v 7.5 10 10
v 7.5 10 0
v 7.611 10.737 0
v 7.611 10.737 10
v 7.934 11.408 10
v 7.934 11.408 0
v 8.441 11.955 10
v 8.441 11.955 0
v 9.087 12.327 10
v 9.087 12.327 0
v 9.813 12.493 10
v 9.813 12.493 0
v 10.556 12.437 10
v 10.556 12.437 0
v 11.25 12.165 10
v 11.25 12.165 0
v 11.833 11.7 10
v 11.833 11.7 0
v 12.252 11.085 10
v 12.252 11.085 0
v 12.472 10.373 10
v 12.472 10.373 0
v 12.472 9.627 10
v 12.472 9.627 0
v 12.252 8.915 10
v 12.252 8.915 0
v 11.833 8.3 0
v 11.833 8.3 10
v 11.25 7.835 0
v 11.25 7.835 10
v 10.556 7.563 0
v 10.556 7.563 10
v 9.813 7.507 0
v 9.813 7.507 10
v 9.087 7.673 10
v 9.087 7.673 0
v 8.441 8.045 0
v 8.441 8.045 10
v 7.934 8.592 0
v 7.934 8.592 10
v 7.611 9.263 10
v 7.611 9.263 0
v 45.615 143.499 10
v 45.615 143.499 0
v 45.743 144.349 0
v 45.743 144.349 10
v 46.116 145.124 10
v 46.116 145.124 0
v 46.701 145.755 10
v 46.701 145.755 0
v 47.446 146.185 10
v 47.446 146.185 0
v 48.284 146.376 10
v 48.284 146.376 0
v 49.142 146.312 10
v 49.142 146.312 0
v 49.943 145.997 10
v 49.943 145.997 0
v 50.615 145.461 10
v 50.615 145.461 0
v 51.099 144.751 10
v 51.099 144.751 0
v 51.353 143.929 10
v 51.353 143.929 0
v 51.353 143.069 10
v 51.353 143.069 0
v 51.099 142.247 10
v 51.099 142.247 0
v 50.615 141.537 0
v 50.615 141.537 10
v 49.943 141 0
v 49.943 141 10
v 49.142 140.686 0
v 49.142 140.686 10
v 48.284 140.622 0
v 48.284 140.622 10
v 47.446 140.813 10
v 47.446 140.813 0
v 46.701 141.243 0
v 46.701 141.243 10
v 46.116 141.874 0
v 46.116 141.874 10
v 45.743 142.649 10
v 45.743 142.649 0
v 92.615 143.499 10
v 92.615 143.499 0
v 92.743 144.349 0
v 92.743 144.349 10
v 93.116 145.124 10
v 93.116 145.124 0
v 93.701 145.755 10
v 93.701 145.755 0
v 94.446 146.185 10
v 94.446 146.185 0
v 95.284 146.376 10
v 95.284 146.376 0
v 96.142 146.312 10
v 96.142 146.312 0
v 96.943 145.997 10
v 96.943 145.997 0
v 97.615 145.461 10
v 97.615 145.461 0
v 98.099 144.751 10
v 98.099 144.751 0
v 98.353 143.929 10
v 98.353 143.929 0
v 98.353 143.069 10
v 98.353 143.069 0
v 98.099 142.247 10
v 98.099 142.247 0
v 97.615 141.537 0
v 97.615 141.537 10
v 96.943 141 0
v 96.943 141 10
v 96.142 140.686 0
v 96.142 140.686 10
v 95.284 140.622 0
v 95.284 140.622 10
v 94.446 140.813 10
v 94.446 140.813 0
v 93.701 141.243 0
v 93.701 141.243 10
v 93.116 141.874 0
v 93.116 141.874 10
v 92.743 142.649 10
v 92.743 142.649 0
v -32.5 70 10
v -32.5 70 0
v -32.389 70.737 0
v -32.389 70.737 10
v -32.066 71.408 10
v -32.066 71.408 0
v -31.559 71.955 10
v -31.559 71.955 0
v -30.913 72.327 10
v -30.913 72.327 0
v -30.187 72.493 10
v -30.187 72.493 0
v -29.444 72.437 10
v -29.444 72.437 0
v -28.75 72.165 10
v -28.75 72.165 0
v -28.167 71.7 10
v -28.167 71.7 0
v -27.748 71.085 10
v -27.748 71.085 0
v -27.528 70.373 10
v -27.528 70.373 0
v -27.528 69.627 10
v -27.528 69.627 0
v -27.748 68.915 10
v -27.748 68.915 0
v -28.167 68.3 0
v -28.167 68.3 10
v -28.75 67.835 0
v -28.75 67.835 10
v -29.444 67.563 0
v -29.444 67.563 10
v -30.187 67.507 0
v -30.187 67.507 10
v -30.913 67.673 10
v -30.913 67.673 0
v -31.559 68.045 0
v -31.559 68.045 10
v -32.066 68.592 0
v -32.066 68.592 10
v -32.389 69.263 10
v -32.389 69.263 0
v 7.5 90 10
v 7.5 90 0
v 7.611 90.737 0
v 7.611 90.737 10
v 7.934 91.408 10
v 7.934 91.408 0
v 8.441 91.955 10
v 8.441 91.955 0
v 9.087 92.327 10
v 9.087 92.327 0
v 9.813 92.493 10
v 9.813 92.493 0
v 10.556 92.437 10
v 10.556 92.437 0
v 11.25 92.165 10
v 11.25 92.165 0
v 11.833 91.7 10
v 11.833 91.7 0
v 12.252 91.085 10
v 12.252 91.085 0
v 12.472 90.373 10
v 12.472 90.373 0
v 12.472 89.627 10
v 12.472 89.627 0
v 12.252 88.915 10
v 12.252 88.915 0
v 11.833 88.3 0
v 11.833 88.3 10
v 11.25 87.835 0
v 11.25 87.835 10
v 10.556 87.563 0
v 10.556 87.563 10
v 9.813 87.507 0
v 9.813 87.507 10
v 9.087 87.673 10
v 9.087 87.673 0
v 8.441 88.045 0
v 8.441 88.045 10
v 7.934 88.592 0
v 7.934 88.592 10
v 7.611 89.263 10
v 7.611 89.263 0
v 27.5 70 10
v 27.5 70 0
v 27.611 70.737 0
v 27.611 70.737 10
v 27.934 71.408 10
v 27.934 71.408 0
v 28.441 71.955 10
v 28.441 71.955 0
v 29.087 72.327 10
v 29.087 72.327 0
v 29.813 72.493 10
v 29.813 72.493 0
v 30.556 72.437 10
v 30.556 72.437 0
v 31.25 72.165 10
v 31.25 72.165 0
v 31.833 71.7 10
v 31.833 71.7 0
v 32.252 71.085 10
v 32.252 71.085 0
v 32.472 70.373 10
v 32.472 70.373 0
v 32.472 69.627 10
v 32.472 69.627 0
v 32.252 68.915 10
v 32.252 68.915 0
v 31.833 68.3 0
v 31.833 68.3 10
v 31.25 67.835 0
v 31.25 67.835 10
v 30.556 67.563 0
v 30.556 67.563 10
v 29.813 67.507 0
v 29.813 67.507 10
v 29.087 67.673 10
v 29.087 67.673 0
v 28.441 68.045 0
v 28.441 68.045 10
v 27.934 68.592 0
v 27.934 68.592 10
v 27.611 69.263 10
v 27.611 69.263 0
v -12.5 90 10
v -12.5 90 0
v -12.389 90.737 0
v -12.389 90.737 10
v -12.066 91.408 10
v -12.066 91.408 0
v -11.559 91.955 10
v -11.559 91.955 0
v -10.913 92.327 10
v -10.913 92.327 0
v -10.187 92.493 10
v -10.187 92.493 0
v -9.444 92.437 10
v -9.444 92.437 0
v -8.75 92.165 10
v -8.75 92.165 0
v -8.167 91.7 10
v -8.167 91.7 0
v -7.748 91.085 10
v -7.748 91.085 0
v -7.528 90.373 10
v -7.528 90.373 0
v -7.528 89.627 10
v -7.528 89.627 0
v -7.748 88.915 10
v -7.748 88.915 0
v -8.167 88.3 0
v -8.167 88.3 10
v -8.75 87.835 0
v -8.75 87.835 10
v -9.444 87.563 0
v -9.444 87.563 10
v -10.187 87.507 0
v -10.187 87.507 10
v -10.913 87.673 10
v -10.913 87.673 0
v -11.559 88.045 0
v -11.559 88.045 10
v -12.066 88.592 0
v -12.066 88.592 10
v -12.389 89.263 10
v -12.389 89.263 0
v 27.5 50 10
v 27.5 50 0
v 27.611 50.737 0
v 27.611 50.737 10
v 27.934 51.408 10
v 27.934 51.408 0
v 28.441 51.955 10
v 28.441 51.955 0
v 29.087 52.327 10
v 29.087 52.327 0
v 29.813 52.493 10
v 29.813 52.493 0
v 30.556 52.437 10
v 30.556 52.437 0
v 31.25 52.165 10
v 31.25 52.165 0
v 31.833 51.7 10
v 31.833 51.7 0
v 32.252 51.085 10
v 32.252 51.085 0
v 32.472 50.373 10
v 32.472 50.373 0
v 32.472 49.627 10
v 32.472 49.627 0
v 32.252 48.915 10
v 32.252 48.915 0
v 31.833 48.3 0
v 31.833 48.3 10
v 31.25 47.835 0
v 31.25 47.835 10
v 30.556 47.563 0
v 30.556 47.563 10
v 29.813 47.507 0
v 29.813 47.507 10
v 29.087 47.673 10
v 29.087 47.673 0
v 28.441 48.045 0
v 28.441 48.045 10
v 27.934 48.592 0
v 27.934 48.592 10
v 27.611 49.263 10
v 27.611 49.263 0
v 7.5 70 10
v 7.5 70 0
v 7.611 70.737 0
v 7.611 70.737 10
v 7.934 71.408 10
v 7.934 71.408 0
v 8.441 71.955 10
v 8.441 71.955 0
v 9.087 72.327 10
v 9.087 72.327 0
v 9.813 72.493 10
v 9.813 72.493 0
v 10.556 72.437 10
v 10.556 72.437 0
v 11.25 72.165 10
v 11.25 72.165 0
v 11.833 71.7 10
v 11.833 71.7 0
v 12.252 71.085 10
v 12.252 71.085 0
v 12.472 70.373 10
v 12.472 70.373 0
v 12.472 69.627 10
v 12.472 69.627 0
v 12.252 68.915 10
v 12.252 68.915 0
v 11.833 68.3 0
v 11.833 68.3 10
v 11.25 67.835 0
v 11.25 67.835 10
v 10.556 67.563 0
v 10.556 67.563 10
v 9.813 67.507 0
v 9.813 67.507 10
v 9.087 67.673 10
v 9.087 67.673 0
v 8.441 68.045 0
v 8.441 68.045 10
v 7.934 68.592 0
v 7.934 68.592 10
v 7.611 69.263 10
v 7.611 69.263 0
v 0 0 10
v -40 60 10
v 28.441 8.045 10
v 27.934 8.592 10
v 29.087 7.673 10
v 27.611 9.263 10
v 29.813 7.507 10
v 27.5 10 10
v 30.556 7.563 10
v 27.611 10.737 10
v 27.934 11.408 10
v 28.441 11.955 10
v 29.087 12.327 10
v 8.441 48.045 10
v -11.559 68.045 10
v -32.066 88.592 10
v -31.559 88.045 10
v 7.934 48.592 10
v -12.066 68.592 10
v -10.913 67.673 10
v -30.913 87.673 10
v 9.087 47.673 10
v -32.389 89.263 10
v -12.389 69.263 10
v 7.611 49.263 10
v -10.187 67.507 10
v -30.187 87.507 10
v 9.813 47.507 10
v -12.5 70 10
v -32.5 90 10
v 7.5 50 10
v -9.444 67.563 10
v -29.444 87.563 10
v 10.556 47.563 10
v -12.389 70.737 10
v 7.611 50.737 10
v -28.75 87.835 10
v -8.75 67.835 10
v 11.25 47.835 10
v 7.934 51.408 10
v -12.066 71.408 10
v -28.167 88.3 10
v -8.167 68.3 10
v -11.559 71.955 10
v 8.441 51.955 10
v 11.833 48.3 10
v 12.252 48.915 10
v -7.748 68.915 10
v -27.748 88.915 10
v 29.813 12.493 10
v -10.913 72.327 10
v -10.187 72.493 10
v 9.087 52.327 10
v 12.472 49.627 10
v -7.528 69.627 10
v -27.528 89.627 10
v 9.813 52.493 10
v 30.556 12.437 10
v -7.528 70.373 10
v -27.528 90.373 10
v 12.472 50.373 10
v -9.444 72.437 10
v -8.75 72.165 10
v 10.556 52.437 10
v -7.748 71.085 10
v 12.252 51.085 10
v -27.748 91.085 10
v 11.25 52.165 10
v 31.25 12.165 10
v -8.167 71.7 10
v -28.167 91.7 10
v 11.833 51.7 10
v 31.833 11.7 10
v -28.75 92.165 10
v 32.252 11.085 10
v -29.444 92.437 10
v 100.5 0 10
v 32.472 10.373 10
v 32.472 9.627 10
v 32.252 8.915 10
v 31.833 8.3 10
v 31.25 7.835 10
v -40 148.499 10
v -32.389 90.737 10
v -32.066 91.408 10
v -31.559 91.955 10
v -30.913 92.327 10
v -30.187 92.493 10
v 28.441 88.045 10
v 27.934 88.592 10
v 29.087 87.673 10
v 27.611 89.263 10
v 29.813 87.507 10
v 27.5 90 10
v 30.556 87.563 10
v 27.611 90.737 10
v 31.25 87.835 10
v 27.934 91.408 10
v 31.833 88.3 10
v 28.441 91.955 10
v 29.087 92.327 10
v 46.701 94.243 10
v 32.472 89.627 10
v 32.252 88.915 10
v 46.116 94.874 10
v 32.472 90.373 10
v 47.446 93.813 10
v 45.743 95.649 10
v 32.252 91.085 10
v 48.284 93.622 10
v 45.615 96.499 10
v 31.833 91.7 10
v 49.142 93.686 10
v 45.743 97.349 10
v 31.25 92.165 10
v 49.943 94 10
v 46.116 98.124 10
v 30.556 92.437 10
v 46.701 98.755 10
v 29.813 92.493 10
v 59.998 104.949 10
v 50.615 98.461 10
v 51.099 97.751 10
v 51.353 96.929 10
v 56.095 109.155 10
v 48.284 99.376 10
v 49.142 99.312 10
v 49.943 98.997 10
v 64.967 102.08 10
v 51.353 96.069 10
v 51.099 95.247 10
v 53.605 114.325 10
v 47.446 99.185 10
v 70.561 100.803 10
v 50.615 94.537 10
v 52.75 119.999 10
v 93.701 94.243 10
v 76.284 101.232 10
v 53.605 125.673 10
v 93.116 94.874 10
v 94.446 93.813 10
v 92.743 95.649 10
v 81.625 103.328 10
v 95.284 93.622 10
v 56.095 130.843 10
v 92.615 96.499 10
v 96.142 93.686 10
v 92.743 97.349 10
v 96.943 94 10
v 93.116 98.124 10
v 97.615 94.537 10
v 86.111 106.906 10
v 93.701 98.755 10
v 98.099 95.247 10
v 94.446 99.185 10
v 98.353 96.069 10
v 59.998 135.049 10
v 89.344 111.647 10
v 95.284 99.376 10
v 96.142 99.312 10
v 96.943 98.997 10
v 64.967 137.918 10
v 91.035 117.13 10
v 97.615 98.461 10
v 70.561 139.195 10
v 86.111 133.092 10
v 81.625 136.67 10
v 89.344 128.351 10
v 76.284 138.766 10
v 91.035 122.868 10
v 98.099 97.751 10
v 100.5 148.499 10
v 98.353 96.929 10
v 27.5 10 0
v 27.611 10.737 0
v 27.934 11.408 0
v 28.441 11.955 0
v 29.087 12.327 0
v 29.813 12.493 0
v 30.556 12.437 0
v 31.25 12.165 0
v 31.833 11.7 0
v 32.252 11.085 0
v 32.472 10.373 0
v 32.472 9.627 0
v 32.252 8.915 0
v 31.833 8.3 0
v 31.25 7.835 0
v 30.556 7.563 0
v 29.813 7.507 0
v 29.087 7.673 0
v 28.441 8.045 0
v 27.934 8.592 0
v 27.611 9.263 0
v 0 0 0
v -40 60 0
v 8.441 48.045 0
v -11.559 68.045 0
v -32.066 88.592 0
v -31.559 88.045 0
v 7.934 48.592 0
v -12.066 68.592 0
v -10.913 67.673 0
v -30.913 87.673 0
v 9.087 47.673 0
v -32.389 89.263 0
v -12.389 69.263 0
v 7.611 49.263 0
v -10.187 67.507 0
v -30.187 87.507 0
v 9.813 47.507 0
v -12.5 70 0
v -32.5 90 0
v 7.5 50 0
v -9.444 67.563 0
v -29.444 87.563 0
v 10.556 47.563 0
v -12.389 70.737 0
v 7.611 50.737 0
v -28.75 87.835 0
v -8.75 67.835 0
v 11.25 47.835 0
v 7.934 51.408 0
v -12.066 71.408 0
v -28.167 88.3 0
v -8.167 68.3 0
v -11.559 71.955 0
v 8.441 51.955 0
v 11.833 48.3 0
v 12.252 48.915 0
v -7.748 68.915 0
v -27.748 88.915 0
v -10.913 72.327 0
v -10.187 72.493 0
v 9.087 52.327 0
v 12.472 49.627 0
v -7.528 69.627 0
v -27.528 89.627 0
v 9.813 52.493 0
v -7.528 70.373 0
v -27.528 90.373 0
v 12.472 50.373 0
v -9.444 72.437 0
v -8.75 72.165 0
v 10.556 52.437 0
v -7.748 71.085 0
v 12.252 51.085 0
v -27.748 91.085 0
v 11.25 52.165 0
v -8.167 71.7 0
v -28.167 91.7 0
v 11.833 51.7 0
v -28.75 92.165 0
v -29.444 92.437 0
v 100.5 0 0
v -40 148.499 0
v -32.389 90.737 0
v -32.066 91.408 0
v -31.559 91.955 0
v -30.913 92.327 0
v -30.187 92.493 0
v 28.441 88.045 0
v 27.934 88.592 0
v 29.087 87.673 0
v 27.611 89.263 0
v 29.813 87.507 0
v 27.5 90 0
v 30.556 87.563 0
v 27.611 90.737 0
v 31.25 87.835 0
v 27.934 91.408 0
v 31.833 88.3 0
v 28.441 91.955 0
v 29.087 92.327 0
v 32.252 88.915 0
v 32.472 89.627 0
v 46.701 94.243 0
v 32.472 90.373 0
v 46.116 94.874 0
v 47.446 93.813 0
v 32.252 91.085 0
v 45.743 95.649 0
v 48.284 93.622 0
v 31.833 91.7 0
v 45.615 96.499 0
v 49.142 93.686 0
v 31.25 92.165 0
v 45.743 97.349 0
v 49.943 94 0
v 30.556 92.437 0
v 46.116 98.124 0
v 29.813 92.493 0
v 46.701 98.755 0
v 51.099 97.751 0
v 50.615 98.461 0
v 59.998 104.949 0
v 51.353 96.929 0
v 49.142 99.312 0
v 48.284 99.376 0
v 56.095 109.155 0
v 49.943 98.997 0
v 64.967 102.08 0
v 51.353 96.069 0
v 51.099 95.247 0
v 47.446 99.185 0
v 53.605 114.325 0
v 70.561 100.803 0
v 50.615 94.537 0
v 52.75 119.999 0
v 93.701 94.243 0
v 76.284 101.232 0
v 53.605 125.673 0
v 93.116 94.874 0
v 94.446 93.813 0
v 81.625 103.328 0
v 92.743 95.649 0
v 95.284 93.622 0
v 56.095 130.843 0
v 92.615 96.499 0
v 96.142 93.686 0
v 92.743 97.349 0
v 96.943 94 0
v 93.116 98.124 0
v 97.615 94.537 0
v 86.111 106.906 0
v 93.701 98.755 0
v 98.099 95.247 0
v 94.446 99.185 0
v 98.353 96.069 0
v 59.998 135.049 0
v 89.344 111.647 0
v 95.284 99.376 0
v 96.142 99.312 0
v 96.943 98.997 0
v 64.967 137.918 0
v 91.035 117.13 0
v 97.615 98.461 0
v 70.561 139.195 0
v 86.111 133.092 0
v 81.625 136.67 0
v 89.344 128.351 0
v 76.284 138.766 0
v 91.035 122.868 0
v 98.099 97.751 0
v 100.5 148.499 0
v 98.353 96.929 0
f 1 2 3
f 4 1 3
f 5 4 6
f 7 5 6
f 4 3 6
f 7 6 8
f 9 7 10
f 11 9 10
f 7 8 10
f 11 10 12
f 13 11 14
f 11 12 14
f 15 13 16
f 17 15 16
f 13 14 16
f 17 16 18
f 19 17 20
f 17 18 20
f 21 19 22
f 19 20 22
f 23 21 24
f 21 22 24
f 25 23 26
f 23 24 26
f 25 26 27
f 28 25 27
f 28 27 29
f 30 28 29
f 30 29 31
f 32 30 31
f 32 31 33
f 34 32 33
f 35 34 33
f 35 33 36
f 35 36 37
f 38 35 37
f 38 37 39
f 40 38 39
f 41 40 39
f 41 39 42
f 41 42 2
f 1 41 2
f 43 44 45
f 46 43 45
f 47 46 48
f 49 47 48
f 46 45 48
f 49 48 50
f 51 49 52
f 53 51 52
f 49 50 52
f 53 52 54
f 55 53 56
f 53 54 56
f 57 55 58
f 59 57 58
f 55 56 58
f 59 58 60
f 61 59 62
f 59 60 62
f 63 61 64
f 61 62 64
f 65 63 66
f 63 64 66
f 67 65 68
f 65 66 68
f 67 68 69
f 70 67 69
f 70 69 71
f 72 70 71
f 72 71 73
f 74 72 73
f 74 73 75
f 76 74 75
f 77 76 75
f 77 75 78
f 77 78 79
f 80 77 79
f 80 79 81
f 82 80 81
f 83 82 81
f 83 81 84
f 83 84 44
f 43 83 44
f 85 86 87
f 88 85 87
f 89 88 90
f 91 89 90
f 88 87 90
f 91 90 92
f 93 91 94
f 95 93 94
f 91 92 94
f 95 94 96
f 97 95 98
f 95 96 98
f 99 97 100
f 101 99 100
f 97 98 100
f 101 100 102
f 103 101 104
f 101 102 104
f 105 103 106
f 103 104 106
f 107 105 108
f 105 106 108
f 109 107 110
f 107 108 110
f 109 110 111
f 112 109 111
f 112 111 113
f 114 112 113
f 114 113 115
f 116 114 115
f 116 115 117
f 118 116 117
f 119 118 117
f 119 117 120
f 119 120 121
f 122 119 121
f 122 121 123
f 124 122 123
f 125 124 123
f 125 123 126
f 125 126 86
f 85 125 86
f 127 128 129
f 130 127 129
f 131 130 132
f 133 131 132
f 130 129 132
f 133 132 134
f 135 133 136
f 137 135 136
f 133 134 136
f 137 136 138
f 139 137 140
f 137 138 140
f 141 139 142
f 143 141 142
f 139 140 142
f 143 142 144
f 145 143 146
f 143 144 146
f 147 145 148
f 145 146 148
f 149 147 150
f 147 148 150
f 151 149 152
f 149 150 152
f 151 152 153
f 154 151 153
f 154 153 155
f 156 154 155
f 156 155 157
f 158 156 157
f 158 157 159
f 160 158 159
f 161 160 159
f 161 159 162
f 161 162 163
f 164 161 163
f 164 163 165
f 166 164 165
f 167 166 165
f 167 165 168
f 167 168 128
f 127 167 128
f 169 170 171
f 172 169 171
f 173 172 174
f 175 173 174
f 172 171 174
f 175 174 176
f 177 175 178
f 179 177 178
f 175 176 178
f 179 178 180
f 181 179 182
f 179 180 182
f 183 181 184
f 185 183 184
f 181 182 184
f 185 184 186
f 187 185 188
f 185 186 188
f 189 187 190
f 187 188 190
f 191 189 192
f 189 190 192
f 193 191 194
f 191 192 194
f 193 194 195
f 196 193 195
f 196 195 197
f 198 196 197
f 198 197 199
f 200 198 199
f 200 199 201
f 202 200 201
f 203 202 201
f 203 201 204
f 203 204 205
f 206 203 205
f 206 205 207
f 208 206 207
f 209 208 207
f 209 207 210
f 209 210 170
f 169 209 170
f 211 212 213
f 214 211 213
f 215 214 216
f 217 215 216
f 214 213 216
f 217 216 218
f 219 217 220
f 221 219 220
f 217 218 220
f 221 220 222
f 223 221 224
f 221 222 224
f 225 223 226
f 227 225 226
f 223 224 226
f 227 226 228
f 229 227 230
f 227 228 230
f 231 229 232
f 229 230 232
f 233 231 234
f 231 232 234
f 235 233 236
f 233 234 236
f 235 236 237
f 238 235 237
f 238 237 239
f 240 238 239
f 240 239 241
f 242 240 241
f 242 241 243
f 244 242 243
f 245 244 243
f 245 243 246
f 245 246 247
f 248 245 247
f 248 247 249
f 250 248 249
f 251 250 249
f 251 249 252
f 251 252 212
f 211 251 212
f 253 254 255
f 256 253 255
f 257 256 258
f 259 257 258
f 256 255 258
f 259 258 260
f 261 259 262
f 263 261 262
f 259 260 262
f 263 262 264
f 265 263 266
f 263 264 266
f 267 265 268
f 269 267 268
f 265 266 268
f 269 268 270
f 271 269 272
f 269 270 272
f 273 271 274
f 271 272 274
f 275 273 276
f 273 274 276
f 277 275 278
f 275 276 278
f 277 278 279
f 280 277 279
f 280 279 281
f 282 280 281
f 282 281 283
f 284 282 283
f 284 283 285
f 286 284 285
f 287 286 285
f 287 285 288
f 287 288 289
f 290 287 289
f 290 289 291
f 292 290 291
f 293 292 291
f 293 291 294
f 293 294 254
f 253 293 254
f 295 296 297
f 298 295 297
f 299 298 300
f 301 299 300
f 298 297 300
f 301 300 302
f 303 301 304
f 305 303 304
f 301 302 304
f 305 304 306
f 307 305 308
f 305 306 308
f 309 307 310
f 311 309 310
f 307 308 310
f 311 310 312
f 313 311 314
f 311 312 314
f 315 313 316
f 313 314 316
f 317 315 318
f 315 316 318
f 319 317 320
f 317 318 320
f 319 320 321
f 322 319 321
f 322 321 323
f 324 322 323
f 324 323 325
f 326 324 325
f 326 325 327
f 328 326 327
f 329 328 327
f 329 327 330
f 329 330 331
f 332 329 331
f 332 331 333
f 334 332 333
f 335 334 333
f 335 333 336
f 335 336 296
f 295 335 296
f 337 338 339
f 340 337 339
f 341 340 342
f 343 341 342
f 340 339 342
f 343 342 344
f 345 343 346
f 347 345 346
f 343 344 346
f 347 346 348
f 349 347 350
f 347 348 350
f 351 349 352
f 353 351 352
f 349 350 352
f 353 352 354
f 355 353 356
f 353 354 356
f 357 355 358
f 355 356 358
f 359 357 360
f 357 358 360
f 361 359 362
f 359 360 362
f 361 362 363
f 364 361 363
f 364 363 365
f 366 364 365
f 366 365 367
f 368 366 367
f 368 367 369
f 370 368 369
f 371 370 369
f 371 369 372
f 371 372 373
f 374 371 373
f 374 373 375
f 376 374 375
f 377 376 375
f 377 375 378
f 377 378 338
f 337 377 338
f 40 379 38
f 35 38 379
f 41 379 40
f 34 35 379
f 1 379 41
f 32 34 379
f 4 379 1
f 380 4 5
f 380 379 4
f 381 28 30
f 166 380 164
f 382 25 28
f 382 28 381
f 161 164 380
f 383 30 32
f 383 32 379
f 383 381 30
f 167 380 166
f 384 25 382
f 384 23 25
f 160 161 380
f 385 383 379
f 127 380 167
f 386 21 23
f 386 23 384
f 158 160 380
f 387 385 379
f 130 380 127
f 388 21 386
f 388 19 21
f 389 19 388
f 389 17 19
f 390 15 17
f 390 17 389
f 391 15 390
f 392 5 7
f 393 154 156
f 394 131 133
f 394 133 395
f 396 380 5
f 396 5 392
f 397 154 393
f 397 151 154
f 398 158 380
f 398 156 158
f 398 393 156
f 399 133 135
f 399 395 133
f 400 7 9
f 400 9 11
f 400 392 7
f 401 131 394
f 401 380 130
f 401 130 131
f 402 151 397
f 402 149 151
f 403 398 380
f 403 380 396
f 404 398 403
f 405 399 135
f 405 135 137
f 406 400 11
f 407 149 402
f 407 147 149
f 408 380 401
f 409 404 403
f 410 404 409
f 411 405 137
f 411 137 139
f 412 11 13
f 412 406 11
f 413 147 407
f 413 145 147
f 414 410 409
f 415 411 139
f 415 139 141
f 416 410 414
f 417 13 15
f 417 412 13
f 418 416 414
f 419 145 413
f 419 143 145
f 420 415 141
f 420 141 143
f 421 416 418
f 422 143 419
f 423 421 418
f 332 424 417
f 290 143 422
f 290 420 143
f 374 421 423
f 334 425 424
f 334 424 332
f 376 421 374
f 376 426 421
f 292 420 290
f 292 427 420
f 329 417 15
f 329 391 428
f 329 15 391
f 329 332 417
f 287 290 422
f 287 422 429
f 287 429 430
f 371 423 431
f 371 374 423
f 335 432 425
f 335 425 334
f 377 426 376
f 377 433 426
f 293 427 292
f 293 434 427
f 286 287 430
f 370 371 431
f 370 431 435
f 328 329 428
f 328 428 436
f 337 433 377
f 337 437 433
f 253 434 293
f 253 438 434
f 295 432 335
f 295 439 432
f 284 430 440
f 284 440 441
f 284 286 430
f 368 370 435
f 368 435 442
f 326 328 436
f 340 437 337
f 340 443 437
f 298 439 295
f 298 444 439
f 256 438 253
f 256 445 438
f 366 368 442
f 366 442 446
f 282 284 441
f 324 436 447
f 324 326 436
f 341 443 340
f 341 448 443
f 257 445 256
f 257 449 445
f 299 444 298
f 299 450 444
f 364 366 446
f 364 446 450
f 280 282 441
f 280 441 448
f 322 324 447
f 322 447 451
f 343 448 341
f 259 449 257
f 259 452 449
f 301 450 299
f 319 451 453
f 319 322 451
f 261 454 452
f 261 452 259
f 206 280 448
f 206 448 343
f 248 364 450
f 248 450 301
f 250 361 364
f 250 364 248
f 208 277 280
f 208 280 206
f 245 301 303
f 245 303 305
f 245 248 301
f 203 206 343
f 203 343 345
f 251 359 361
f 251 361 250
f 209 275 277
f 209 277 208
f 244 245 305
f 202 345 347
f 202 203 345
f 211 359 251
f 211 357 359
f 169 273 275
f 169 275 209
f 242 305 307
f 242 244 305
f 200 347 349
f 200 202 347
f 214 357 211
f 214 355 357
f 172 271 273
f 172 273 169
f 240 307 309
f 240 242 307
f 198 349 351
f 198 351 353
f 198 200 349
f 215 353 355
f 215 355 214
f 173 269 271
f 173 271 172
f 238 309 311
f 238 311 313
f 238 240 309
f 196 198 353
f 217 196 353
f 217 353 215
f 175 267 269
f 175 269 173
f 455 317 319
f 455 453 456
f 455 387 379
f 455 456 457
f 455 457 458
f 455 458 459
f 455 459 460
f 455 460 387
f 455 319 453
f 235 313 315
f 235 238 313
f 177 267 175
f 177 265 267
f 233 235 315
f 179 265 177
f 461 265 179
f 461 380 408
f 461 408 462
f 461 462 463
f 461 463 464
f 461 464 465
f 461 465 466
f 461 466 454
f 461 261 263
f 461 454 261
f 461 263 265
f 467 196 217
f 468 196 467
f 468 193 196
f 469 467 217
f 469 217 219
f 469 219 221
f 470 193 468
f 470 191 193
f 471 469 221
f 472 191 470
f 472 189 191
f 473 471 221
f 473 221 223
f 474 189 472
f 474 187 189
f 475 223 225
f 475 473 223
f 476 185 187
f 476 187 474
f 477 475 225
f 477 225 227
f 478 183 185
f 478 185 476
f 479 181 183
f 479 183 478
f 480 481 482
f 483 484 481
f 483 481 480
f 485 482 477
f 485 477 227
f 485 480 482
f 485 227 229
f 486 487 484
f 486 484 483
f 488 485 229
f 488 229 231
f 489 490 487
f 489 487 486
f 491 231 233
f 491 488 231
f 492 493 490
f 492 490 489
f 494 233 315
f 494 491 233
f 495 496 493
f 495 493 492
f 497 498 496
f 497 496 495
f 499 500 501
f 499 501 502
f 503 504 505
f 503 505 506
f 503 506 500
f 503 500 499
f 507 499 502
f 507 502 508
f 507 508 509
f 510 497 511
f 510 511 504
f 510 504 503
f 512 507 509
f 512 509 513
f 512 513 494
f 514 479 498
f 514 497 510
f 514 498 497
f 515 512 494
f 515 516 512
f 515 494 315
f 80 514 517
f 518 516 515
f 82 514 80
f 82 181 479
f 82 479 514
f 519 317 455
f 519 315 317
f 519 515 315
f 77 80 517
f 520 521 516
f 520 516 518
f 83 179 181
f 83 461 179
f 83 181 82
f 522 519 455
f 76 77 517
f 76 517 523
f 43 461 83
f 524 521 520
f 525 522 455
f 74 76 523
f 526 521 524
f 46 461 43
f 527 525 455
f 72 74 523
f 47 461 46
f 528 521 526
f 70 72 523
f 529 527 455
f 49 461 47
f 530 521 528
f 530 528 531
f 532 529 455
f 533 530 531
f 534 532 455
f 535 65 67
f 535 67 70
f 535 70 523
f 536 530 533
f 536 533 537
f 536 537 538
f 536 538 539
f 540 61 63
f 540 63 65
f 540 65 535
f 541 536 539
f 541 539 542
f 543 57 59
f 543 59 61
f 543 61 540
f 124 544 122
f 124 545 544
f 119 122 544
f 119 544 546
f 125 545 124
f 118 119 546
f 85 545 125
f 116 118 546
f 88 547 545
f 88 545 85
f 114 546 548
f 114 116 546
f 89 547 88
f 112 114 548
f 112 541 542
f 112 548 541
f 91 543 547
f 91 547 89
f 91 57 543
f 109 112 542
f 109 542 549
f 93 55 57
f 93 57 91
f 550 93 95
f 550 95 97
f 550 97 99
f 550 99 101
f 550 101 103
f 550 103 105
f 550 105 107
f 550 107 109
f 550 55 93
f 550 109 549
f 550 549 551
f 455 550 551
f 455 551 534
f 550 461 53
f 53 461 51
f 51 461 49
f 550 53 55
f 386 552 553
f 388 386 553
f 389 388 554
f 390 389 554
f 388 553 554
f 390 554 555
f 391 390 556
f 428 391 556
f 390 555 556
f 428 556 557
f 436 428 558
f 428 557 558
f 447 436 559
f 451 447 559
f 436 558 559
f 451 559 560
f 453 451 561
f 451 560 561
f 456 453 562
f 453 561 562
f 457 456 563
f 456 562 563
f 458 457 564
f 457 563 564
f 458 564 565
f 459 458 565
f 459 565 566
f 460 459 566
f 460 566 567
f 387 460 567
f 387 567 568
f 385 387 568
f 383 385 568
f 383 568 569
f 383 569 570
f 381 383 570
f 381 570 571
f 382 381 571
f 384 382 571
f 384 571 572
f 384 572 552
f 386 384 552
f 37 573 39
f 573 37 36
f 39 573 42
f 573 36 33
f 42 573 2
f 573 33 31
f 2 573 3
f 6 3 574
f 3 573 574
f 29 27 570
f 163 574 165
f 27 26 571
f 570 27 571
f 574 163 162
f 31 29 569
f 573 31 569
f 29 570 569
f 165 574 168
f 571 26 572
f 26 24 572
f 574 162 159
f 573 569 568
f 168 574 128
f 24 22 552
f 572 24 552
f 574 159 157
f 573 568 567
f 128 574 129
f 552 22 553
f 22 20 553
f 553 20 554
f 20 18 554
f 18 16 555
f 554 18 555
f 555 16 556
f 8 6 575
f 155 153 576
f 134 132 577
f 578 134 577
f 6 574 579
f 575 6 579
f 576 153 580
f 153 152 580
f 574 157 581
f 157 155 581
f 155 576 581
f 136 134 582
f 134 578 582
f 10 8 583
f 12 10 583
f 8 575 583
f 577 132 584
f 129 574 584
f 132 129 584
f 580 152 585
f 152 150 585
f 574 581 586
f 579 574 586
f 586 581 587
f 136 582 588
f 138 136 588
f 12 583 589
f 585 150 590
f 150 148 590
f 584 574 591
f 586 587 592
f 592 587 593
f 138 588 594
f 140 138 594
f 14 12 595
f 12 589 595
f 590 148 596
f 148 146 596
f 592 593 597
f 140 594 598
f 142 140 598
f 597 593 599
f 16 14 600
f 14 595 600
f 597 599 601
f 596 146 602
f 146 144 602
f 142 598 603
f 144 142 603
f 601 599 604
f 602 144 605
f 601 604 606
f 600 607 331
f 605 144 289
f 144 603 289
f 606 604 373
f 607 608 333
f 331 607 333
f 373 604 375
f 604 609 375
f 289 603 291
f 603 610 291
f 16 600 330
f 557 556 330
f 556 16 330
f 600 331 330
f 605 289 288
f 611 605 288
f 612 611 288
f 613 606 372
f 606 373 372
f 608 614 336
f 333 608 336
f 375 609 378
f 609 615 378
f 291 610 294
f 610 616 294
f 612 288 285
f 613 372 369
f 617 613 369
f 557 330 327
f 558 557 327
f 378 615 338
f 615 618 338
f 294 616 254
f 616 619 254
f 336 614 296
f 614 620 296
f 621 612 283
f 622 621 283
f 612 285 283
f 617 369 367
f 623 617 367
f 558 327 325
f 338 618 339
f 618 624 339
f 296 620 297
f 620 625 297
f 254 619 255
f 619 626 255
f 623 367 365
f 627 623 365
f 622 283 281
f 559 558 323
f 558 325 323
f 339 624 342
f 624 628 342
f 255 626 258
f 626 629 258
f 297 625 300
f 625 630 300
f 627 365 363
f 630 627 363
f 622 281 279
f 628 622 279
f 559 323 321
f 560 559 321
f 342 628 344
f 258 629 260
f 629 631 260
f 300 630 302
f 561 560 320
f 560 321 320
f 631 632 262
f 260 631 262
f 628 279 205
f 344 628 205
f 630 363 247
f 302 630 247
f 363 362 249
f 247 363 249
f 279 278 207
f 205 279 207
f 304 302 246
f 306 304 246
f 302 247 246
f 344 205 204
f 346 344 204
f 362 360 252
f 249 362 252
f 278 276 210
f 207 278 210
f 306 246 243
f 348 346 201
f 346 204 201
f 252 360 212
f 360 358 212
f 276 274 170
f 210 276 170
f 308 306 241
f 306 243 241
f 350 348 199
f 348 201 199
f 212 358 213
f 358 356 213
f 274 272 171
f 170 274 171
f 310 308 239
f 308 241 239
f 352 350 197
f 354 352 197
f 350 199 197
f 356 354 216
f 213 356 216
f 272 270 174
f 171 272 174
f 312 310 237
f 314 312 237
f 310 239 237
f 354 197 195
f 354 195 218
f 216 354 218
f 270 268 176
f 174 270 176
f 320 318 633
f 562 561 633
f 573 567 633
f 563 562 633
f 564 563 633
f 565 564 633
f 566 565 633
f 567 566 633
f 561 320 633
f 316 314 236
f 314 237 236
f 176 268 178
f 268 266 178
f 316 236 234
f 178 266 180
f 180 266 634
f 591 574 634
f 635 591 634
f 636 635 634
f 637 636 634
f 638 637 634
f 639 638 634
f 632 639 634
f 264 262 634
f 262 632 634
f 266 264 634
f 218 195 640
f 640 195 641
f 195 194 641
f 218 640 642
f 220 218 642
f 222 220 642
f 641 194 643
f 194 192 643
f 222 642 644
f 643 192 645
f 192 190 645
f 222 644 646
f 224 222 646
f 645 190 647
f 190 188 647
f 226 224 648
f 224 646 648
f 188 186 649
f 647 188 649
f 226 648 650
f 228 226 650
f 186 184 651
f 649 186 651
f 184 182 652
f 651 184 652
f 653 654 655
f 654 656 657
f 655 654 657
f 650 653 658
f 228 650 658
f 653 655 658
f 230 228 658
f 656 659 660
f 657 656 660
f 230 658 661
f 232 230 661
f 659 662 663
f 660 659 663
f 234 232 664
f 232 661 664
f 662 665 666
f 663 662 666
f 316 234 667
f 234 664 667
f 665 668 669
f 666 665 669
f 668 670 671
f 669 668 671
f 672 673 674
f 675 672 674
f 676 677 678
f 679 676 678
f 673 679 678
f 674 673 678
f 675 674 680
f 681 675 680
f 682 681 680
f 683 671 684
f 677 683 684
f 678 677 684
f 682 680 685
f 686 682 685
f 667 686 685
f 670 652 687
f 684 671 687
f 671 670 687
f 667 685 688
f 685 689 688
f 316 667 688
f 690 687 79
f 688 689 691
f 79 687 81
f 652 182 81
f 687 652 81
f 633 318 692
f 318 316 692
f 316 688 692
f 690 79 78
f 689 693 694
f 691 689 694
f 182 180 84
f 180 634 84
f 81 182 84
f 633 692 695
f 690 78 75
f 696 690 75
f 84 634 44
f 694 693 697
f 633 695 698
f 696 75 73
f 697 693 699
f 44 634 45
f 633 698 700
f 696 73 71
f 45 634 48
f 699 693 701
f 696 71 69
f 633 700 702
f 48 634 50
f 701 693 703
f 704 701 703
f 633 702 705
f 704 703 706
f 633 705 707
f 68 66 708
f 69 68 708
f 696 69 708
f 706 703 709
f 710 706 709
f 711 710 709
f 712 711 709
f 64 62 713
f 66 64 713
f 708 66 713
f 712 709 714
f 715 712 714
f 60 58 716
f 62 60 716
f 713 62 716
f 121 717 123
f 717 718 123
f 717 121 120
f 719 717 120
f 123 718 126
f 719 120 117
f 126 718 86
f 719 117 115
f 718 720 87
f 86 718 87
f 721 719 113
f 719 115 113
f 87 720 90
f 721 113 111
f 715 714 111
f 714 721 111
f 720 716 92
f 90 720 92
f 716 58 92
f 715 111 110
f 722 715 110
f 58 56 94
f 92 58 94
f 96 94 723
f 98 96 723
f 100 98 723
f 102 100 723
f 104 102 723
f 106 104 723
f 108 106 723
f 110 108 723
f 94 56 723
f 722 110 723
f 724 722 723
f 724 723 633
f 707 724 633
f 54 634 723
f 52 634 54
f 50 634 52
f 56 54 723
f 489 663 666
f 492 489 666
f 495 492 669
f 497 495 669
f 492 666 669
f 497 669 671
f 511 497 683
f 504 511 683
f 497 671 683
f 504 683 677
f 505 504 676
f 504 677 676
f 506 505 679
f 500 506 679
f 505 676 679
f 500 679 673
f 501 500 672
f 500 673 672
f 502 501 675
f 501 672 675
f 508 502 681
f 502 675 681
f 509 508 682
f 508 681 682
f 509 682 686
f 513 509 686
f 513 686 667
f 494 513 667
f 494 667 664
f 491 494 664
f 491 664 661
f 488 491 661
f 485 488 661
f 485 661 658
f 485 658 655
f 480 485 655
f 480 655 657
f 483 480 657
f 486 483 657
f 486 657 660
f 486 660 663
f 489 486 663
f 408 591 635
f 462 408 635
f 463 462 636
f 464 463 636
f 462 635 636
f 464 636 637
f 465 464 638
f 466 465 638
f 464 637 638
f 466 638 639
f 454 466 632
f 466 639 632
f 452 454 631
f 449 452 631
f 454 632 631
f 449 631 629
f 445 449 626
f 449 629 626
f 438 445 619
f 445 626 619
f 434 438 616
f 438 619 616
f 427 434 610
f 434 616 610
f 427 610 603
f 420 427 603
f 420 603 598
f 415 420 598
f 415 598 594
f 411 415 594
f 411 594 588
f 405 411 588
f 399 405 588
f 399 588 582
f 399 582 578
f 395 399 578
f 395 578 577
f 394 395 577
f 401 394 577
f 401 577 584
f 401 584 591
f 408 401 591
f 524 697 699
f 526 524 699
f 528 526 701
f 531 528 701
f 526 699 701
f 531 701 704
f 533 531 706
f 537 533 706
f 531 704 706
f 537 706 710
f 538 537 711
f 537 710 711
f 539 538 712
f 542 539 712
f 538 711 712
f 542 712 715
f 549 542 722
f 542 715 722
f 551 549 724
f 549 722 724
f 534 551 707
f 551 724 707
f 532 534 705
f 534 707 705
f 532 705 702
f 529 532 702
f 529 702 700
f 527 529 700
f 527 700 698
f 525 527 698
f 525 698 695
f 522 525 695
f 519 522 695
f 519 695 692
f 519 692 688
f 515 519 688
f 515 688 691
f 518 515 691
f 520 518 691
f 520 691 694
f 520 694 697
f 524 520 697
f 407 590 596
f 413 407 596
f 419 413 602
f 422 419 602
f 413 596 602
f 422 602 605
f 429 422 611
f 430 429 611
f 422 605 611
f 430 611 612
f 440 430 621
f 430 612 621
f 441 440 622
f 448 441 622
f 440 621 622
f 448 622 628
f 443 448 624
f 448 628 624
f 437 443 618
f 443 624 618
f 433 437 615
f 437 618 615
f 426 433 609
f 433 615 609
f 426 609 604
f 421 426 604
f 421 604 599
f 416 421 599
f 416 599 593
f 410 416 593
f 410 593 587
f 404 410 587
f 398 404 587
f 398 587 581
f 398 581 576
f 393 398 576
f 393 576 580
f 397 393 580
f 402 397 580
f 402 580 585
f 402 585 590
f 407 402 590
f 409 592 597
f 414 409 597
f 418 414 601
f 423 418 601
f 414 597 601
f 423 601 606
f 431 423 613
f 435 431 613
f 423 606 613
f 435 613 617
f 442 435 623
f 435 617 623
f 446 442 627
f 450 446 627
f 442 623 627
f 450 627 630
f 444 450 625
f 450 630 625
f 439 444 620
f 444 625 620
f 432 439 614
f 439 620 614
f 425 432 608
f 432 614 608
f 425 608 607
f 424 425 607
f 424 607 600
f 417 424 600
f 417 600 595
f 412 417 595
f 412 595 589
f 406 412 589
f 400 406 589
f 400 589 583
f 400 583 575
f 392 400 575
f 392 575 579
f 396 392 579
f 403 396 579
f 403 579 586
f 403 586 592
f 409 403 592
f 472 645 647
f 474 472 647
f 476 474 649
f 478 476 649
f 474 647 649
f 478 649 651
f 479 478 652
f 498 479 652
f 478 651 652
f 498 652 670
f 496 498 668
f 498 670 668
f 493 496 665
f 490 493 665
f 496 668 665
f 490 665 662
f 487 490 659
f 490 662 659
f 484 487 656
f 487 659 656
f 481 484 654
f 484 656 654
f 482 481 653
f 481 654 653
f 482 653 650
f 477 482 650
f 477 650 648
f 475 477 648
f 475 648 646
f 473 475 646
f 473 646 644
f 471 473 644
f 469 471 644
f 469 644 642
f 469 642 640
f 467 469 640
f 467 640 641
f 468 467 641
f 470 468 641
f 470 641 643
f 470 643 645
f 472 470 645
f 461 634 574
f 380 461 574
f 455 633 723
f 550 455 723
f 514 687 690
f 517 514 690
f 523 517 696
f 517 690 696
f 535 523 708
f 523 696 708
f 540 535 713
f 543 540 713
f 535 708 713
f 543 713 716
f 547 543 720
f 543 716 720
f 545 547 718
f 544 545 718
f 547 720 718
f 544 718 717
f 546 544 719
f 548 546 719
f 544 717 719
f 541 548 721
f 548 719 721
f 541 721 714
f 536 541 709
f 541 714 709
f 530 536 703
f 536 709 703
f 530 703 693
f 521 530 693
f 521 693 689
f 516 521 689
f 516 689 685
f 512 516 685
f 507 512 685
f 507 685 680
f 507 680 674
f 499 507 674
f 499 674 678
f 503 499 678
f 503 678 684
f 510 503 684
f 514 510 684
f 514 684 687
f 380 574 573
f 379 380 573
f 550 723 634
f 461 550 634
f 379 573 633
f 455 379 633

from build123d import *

# Parameters (mm, degrees)
BOSS_EXTRUDE1_DEPTH = 10
CUT_EXTRUDE1_REACH  = 181.589
SKETCH3_R           = 19.25
SKETCH3_R_2         = 2.5
SKETCH3_R_3         = 2.885000751


with BuildPart() as part:
    # Sketch1 → Boss-Extrude1 (new body)
    with BuildSketch(Plane.XY):
        Polygon((0, 0), (100.5, 0), (100.5, 148.49893218), (-40, 148.49893218), (-40, 60), align=None)
    extrude(amount=BOSS_EXTRUDE1_DEPTH)

    # Sketch3 → Cut-Extrude1 (cut, up to next)
    with BuildSketch(Plane(origin=(0, 0, 0), x_dir=(-1, 0, 0), z_dir=(0, 0, -1)), mode=Mode.PRIVATE) as cut_extrude1_sk1:
        with Locations((-72, 119.99893218)):
            Circle(SKETCH3_R)
    cut_extrude1_tool1 = extrude(cut_extrude1_sk1.sketch, amount=-CUT_EXTRUDE1_REACH, mode=Mode.PRIVATE) & part.part
    # Sketch3 → Cut-Extrude1 (cut, up to next)
    with BuildSketch(Plane(origin=(0, 0, 0), x_dir=(-1, 0, 0), z_dir=(0, 0, -1)), mode=Mode.PRIVATE) as cut_extrude1_sk2:
        with Locations((-30, 50)):
            Circle(SKETCH3_R_2)
    cut_extrude1_tool2 = extrude(cut_extrude1_sk2.sketch, amount=-CUT_EXTRUDE1_REACH, mode=Mode.PRIVATE) & part.part
    # Sketch3 → Cut-Extrude1 (cut, up to next)
    with BuildSketch(Plane(origin=(0, 0, 0), x_dir=(-1, 0, 0), z_dir=(0, 0, -1)), mode=Mode.PRIVATE) as cut_extrude1_sk3:
        with Locations((-10, 50)):
            Circle(SKETCH3_R_2)
    cut_extrude1_tool3 = extrude(cut_extrude1_sk3.sketch, amount=-CUT_EXTRUDE1_REACH, mode=Mode.PRIVATE) & part.part
    # Sketch3 → Cut-Extrude1 (cut, up to next)
    with BuildSketch(Plane(origin=(0, 0, 0), x_dir=(-1, 0, 0), z_dir=(0, 0, -1)), mode=Mode.PRIVATE) as cut_extrude1_sk4:
        with Locations((-30, 10)):
            Circle(SKETCH3_R_2)
    cut_extrude1_tool4 = extrude(cut_extrude1_sk4.sketch, amount=-CUT_EXTRUDE1_REACH, mode=Mode.PRIVATE) & part.part
    # Sketch3 → Cut-Extrude1 (cut, up to next)
    with BuildSketch(Plane(origin=(0, 0, 0), x_dir=(-1, 0, 0), z_dir=(0, 0, -1)), mode=Mode.PRIVATE) as cut_extrude1_sk5:
        with Locations((-10, 10)):
            Circle(SKETCH3_R_2)
    cut_extrude1_tool5 = extrude(cut_extrude1_sk5.sketch, amount=-CUT_EXTRUDE1_REACH, mode=Mode.PRIVATE) & part.part
    # Sketch3 → Cut-Extrude1 (cut, up to next)
    with BuildSketch(Plane(origin=(0, 0, 0), x_dir=(-1, 0, 0), z_dir=(0, 0, -1)), mode=Mode.PRIVATE) as cut_extrude1_sk6:
        with Locations((30, 70)):
            Circle(SKETCH3_R_2)
    cut_extrude1_tool6 = extrude(cut_extrude1_sk6.sketch, amount=-CUT_EXTRUDE1_REACH, mode=Mode.PRIVATE) & part.part
    # Sketch3 → Cut-Extrude1 (cut, up to next)
    with BuildSketch(Plane(origin=(0, 0, 0), x_dir=(-1, 0, 0), z_dir=(0, 0, -1)), mode=Mode.PRIVATE) as cut_extrude1_sk7:
        with Locations((30, 90)):
            Circle(SKETCH3_R_2)
    cut_extrude1_tool7 = extrude(cut_extrude1_sk7.sketch, amount=-CUT_EXTRUDE1_REACH, mode=Mode.PRIVATE) & part.part
    # Sketch3 → Cut-Extrude1 (cut, up to next)
    with BuildSketch(Plane(origin=(0, 0, 0), x_dir=(-1, 0, 0), z_dir=(0, 0, -1)), mode=Mode.PRIVATE) as cut_extrude1_sk8:
        with Locations((10, 90)):
            Circle(SKETCH3_R_2)
    cut_extrude1_tool8 = extrude(cut_extrude1_sk8.sketch, amount=-CUT_EXTRUDE1_REACH, mode=Mode.PRIVATE) & part.part
    # Sketch3 → Cut-Extrude1 (cut, up to next)
    with BuildSketch(Plane(origin=(0, 0, 0), x_dir=(-1, 0, 0), z_dir=(0, 0, -1)), mode=Mode.PRIVATE) as cut_extrude1_sk9:
        with Locations((10, 70)):
            Circle(SKETCH3_R_2)
    cut_extrude1_tool9 = extrude(cut_extrude1_sk9.sketch, amount=-CUT_EXTRUDE1_REACH, mode=Mode.PRIVATE) & part.part
    # Sketch3 → Cut-Extrude1 (cut, up to next)
    with BuildSketch(Plane(origin=(0, 0, 0), x_dir=(-1, 0, 0), z_dir=(0, 0, -1)), mode=Mode.PRIVATE) as cut_extrude1_sk10:
        with Locations((-10, 70)):
            Circle(SKETCH3_R_2)
    cut_extrude1_tool10 = extrude(cut_extrude1_sk10.sketch, amount=-CUT_EXTRUDE1_REACH, mode=Mode.PRIVATE) & part.part
    # Sketch3 → Cut-Extrude1 (cut, up to next)
    with BuildSketch(Plane(origin=(0, 0, 0), x_dir=(-1, 0, 0), z_dir=(0, 0, -1)), mode=Mode.PRIVATE) as cut_extrude1_sk11:
        with Locations((-10, 90)):
            Circle(SKETCH3_R_2)
    cut_extrude1_tool11 = extrude(cut_extrude1_sk11.sketch, amount=-CUT_EXTRUDE1_REACH, mode=Mode.PRIVATE) & part.part
    # Sketch3 → Cut-Extrude1 (cut, up to next)
    with BuildSketch(Plane(origin=(0, 0, 0), x_dir=(-1, 0, 0), z_dir=(0, 0, -1)), mode=Mode.PRIVATE) as cut_extrude1_sk12:
        with Locations((-30, 90)):
            Circle(SKETCH3_R_2)
    cut_extrude1_tool12 = extrude(cut_extrude1_sk12.sketch, amount=-CUT_EXTRUDE1_REACH, mode=Mode.PRIVATE) & part.part
    # Sketch3 → Cut-Extrude1 (cut, up to next)
    with BuildSketch(Plane(origin=(0, 0, 0), x_dir=(-1, 0, 0), z_dir=(0, 0, -1)), mode=Mode.PRIVATE) as cut_extrude1_sk13:
        with Locations((-30, 70)):
            Circle(SKETCH3_R_2)
    cut_extrude1_tool13 = extrude(cut_extrude1_sk13.sketch, amount=-CUT_EXTRUDE1_REACH, mode=Mode.PRIVATE) & part.part
    # Sketch3 → Cut-Extrude1 (cut, up to next)
    with BuildSketch(Plane(origin=(0, 0, 0), x_dir=(-1, 0, 0), z_dir=(0, 0, -1)), mode=Mode.PRIVATE) as cut_extrude1_sk14:
        with Locations((-95.5, 143.49893218)):
            Circle(SKETCH3_R_3)
    cut_extrude1_tool14 = extrude(cut_extrude1_sk14.sketch, amount=-CUT_EXTRUDE1_REACH, mode=Mode.PRIVATE) & part.part
    # Sketch3 → Cut-Extrude1 (cut, up to next)
    with BuildSketch(Plane(origin=(0, 0, 0), x_dir=(-1, 0, 0), z_dir=(0, 0, -1)), mode=Mode.PRIVATE) as cut_extrude1_sk15:
        with Locations((-48.5, 143.49893218)):
            Circle(SKETCH3_R_3)
    cut_extrude1_tool15 = extrude(cut_extrude1_sk15.sketch, amount=-CUT_EXTRUDE1_REACH, mode=Mode.PRIVATE) & part.part
    # Sketch3 → Cut-Extrude1 (cut, up to next)
    with BuildSketch(Plane(origin=(0, 0, 0), x_dir=(-1, 0, 0), z_dir=(0, 0, -1)), mode=Mode.PRIVATE) as cut_extrude1_sk16:
        with Locations((-48.5, 96.49893218)):
            Circle(SKETCH3_R_3)
    cut_extrude1_tool16 = extrude(cut_extrude1_sk16.sketch, amount=-CUT_EXTRUDE1_REACH, mode=Mode.PRIVATE) & part.part
    # Sketch3 → Cut-Extrude1 (cut, up to next)
    with BuildSketch(Plane(origin=(0, 0, 0), x_dir=(-1, 0, 0), z_dir=(0, 0, -1)), mode=Mode.PRIVATE) as cut_extrude1_sk17:
        with Locations((-95.5, 96.49893218)):
            Circle(SKETCH3_R_3)
    cut_extrude1_tool17 = extrude(cut_extrude1_sk17.sketch, amount=-CUT_EXTRUDE1_REACH, mode=Mode.PRIVATE) & part.part
    add(cut_extrude1_tool1.solids().sort_by_distance((72, 119.998932, 0))[0], mode=Mode.SUBTRACT)
    add(cut_extrude1_tool2.solids().sort_by_distance((30, 50, 0))[0], mode=Mode.SUBTRACT)
    add(cut_extrude1_tool3.solids().sort_by_distance((10, 50, 0))[0], mode=Mode.SUBTRACT)
    add(cut_extrude1_tool4.solids().sort_by_distance((30, 10, 0))[0], mode=Mode.SUBTRACT)
    add(cut_extrude1_tool5.solids().sort_by_distance((10, 10, 0))[0], mode=Mode.SUBTRACT)
    add(cut_extrude1_tool6.solids().sort_by_distance((-30, 70, 0))[0], mode=Mode.SUBTRACT)
    add(cut_extrude1_tool7.solids().sort_by_distance((-30, 90, 0))[0], mode=Mode.SUBTRACT)
    add(cut_extrude1_tool8.solids().sort_by_distance((-10, 90, 0))[0], mode=Mode.SUBTRACT)
    add(cut_extrude1_tool9.solids().sort_by_distance((-10, 70, 0))[0], mode=Mode.SUBTRACT)
    add(cut_extrude1_tool10.solids().sort_by_distance((10, 70, 0))[0], mode=Mode.SUBTRACT)
    add(cut_extrude1_tool11.solids().sort_by_distance((10, 90, 0))[0], mode=Mode.SUBTRACT)
    add(cut_extrude1_tool12.solids().sort_by_distance((30, 90, 0))[0], mode=Mode.SUBTRACT)
    add(cut_extrude1_tool13.solids().sort_by_distance((30, 70, 0))[0], mode=Mode.SUBTRACT)
    add(cut_extrude1_tool14.solids().sort_by_distance((95.5, 143.498932, 0))[0], mode=Mode.SUBTRACT)
    add(cut_extrude1_tool15.solids().sort_by_distance((48.5, 143.498932, 0))[0], mode=Mode.SUBTRACT)
    add(cut_extrude1_tool16.solids().sort_by_distance((48.5, 96.498932, 0))[0], mode=Mode.SUBTRACT)
    add(cut_extrude1_tool17.solids().sort_by_distance((95.5, 96.498932, 0))[0], mode=Mode.SUBTRACT)


solid = part.part
